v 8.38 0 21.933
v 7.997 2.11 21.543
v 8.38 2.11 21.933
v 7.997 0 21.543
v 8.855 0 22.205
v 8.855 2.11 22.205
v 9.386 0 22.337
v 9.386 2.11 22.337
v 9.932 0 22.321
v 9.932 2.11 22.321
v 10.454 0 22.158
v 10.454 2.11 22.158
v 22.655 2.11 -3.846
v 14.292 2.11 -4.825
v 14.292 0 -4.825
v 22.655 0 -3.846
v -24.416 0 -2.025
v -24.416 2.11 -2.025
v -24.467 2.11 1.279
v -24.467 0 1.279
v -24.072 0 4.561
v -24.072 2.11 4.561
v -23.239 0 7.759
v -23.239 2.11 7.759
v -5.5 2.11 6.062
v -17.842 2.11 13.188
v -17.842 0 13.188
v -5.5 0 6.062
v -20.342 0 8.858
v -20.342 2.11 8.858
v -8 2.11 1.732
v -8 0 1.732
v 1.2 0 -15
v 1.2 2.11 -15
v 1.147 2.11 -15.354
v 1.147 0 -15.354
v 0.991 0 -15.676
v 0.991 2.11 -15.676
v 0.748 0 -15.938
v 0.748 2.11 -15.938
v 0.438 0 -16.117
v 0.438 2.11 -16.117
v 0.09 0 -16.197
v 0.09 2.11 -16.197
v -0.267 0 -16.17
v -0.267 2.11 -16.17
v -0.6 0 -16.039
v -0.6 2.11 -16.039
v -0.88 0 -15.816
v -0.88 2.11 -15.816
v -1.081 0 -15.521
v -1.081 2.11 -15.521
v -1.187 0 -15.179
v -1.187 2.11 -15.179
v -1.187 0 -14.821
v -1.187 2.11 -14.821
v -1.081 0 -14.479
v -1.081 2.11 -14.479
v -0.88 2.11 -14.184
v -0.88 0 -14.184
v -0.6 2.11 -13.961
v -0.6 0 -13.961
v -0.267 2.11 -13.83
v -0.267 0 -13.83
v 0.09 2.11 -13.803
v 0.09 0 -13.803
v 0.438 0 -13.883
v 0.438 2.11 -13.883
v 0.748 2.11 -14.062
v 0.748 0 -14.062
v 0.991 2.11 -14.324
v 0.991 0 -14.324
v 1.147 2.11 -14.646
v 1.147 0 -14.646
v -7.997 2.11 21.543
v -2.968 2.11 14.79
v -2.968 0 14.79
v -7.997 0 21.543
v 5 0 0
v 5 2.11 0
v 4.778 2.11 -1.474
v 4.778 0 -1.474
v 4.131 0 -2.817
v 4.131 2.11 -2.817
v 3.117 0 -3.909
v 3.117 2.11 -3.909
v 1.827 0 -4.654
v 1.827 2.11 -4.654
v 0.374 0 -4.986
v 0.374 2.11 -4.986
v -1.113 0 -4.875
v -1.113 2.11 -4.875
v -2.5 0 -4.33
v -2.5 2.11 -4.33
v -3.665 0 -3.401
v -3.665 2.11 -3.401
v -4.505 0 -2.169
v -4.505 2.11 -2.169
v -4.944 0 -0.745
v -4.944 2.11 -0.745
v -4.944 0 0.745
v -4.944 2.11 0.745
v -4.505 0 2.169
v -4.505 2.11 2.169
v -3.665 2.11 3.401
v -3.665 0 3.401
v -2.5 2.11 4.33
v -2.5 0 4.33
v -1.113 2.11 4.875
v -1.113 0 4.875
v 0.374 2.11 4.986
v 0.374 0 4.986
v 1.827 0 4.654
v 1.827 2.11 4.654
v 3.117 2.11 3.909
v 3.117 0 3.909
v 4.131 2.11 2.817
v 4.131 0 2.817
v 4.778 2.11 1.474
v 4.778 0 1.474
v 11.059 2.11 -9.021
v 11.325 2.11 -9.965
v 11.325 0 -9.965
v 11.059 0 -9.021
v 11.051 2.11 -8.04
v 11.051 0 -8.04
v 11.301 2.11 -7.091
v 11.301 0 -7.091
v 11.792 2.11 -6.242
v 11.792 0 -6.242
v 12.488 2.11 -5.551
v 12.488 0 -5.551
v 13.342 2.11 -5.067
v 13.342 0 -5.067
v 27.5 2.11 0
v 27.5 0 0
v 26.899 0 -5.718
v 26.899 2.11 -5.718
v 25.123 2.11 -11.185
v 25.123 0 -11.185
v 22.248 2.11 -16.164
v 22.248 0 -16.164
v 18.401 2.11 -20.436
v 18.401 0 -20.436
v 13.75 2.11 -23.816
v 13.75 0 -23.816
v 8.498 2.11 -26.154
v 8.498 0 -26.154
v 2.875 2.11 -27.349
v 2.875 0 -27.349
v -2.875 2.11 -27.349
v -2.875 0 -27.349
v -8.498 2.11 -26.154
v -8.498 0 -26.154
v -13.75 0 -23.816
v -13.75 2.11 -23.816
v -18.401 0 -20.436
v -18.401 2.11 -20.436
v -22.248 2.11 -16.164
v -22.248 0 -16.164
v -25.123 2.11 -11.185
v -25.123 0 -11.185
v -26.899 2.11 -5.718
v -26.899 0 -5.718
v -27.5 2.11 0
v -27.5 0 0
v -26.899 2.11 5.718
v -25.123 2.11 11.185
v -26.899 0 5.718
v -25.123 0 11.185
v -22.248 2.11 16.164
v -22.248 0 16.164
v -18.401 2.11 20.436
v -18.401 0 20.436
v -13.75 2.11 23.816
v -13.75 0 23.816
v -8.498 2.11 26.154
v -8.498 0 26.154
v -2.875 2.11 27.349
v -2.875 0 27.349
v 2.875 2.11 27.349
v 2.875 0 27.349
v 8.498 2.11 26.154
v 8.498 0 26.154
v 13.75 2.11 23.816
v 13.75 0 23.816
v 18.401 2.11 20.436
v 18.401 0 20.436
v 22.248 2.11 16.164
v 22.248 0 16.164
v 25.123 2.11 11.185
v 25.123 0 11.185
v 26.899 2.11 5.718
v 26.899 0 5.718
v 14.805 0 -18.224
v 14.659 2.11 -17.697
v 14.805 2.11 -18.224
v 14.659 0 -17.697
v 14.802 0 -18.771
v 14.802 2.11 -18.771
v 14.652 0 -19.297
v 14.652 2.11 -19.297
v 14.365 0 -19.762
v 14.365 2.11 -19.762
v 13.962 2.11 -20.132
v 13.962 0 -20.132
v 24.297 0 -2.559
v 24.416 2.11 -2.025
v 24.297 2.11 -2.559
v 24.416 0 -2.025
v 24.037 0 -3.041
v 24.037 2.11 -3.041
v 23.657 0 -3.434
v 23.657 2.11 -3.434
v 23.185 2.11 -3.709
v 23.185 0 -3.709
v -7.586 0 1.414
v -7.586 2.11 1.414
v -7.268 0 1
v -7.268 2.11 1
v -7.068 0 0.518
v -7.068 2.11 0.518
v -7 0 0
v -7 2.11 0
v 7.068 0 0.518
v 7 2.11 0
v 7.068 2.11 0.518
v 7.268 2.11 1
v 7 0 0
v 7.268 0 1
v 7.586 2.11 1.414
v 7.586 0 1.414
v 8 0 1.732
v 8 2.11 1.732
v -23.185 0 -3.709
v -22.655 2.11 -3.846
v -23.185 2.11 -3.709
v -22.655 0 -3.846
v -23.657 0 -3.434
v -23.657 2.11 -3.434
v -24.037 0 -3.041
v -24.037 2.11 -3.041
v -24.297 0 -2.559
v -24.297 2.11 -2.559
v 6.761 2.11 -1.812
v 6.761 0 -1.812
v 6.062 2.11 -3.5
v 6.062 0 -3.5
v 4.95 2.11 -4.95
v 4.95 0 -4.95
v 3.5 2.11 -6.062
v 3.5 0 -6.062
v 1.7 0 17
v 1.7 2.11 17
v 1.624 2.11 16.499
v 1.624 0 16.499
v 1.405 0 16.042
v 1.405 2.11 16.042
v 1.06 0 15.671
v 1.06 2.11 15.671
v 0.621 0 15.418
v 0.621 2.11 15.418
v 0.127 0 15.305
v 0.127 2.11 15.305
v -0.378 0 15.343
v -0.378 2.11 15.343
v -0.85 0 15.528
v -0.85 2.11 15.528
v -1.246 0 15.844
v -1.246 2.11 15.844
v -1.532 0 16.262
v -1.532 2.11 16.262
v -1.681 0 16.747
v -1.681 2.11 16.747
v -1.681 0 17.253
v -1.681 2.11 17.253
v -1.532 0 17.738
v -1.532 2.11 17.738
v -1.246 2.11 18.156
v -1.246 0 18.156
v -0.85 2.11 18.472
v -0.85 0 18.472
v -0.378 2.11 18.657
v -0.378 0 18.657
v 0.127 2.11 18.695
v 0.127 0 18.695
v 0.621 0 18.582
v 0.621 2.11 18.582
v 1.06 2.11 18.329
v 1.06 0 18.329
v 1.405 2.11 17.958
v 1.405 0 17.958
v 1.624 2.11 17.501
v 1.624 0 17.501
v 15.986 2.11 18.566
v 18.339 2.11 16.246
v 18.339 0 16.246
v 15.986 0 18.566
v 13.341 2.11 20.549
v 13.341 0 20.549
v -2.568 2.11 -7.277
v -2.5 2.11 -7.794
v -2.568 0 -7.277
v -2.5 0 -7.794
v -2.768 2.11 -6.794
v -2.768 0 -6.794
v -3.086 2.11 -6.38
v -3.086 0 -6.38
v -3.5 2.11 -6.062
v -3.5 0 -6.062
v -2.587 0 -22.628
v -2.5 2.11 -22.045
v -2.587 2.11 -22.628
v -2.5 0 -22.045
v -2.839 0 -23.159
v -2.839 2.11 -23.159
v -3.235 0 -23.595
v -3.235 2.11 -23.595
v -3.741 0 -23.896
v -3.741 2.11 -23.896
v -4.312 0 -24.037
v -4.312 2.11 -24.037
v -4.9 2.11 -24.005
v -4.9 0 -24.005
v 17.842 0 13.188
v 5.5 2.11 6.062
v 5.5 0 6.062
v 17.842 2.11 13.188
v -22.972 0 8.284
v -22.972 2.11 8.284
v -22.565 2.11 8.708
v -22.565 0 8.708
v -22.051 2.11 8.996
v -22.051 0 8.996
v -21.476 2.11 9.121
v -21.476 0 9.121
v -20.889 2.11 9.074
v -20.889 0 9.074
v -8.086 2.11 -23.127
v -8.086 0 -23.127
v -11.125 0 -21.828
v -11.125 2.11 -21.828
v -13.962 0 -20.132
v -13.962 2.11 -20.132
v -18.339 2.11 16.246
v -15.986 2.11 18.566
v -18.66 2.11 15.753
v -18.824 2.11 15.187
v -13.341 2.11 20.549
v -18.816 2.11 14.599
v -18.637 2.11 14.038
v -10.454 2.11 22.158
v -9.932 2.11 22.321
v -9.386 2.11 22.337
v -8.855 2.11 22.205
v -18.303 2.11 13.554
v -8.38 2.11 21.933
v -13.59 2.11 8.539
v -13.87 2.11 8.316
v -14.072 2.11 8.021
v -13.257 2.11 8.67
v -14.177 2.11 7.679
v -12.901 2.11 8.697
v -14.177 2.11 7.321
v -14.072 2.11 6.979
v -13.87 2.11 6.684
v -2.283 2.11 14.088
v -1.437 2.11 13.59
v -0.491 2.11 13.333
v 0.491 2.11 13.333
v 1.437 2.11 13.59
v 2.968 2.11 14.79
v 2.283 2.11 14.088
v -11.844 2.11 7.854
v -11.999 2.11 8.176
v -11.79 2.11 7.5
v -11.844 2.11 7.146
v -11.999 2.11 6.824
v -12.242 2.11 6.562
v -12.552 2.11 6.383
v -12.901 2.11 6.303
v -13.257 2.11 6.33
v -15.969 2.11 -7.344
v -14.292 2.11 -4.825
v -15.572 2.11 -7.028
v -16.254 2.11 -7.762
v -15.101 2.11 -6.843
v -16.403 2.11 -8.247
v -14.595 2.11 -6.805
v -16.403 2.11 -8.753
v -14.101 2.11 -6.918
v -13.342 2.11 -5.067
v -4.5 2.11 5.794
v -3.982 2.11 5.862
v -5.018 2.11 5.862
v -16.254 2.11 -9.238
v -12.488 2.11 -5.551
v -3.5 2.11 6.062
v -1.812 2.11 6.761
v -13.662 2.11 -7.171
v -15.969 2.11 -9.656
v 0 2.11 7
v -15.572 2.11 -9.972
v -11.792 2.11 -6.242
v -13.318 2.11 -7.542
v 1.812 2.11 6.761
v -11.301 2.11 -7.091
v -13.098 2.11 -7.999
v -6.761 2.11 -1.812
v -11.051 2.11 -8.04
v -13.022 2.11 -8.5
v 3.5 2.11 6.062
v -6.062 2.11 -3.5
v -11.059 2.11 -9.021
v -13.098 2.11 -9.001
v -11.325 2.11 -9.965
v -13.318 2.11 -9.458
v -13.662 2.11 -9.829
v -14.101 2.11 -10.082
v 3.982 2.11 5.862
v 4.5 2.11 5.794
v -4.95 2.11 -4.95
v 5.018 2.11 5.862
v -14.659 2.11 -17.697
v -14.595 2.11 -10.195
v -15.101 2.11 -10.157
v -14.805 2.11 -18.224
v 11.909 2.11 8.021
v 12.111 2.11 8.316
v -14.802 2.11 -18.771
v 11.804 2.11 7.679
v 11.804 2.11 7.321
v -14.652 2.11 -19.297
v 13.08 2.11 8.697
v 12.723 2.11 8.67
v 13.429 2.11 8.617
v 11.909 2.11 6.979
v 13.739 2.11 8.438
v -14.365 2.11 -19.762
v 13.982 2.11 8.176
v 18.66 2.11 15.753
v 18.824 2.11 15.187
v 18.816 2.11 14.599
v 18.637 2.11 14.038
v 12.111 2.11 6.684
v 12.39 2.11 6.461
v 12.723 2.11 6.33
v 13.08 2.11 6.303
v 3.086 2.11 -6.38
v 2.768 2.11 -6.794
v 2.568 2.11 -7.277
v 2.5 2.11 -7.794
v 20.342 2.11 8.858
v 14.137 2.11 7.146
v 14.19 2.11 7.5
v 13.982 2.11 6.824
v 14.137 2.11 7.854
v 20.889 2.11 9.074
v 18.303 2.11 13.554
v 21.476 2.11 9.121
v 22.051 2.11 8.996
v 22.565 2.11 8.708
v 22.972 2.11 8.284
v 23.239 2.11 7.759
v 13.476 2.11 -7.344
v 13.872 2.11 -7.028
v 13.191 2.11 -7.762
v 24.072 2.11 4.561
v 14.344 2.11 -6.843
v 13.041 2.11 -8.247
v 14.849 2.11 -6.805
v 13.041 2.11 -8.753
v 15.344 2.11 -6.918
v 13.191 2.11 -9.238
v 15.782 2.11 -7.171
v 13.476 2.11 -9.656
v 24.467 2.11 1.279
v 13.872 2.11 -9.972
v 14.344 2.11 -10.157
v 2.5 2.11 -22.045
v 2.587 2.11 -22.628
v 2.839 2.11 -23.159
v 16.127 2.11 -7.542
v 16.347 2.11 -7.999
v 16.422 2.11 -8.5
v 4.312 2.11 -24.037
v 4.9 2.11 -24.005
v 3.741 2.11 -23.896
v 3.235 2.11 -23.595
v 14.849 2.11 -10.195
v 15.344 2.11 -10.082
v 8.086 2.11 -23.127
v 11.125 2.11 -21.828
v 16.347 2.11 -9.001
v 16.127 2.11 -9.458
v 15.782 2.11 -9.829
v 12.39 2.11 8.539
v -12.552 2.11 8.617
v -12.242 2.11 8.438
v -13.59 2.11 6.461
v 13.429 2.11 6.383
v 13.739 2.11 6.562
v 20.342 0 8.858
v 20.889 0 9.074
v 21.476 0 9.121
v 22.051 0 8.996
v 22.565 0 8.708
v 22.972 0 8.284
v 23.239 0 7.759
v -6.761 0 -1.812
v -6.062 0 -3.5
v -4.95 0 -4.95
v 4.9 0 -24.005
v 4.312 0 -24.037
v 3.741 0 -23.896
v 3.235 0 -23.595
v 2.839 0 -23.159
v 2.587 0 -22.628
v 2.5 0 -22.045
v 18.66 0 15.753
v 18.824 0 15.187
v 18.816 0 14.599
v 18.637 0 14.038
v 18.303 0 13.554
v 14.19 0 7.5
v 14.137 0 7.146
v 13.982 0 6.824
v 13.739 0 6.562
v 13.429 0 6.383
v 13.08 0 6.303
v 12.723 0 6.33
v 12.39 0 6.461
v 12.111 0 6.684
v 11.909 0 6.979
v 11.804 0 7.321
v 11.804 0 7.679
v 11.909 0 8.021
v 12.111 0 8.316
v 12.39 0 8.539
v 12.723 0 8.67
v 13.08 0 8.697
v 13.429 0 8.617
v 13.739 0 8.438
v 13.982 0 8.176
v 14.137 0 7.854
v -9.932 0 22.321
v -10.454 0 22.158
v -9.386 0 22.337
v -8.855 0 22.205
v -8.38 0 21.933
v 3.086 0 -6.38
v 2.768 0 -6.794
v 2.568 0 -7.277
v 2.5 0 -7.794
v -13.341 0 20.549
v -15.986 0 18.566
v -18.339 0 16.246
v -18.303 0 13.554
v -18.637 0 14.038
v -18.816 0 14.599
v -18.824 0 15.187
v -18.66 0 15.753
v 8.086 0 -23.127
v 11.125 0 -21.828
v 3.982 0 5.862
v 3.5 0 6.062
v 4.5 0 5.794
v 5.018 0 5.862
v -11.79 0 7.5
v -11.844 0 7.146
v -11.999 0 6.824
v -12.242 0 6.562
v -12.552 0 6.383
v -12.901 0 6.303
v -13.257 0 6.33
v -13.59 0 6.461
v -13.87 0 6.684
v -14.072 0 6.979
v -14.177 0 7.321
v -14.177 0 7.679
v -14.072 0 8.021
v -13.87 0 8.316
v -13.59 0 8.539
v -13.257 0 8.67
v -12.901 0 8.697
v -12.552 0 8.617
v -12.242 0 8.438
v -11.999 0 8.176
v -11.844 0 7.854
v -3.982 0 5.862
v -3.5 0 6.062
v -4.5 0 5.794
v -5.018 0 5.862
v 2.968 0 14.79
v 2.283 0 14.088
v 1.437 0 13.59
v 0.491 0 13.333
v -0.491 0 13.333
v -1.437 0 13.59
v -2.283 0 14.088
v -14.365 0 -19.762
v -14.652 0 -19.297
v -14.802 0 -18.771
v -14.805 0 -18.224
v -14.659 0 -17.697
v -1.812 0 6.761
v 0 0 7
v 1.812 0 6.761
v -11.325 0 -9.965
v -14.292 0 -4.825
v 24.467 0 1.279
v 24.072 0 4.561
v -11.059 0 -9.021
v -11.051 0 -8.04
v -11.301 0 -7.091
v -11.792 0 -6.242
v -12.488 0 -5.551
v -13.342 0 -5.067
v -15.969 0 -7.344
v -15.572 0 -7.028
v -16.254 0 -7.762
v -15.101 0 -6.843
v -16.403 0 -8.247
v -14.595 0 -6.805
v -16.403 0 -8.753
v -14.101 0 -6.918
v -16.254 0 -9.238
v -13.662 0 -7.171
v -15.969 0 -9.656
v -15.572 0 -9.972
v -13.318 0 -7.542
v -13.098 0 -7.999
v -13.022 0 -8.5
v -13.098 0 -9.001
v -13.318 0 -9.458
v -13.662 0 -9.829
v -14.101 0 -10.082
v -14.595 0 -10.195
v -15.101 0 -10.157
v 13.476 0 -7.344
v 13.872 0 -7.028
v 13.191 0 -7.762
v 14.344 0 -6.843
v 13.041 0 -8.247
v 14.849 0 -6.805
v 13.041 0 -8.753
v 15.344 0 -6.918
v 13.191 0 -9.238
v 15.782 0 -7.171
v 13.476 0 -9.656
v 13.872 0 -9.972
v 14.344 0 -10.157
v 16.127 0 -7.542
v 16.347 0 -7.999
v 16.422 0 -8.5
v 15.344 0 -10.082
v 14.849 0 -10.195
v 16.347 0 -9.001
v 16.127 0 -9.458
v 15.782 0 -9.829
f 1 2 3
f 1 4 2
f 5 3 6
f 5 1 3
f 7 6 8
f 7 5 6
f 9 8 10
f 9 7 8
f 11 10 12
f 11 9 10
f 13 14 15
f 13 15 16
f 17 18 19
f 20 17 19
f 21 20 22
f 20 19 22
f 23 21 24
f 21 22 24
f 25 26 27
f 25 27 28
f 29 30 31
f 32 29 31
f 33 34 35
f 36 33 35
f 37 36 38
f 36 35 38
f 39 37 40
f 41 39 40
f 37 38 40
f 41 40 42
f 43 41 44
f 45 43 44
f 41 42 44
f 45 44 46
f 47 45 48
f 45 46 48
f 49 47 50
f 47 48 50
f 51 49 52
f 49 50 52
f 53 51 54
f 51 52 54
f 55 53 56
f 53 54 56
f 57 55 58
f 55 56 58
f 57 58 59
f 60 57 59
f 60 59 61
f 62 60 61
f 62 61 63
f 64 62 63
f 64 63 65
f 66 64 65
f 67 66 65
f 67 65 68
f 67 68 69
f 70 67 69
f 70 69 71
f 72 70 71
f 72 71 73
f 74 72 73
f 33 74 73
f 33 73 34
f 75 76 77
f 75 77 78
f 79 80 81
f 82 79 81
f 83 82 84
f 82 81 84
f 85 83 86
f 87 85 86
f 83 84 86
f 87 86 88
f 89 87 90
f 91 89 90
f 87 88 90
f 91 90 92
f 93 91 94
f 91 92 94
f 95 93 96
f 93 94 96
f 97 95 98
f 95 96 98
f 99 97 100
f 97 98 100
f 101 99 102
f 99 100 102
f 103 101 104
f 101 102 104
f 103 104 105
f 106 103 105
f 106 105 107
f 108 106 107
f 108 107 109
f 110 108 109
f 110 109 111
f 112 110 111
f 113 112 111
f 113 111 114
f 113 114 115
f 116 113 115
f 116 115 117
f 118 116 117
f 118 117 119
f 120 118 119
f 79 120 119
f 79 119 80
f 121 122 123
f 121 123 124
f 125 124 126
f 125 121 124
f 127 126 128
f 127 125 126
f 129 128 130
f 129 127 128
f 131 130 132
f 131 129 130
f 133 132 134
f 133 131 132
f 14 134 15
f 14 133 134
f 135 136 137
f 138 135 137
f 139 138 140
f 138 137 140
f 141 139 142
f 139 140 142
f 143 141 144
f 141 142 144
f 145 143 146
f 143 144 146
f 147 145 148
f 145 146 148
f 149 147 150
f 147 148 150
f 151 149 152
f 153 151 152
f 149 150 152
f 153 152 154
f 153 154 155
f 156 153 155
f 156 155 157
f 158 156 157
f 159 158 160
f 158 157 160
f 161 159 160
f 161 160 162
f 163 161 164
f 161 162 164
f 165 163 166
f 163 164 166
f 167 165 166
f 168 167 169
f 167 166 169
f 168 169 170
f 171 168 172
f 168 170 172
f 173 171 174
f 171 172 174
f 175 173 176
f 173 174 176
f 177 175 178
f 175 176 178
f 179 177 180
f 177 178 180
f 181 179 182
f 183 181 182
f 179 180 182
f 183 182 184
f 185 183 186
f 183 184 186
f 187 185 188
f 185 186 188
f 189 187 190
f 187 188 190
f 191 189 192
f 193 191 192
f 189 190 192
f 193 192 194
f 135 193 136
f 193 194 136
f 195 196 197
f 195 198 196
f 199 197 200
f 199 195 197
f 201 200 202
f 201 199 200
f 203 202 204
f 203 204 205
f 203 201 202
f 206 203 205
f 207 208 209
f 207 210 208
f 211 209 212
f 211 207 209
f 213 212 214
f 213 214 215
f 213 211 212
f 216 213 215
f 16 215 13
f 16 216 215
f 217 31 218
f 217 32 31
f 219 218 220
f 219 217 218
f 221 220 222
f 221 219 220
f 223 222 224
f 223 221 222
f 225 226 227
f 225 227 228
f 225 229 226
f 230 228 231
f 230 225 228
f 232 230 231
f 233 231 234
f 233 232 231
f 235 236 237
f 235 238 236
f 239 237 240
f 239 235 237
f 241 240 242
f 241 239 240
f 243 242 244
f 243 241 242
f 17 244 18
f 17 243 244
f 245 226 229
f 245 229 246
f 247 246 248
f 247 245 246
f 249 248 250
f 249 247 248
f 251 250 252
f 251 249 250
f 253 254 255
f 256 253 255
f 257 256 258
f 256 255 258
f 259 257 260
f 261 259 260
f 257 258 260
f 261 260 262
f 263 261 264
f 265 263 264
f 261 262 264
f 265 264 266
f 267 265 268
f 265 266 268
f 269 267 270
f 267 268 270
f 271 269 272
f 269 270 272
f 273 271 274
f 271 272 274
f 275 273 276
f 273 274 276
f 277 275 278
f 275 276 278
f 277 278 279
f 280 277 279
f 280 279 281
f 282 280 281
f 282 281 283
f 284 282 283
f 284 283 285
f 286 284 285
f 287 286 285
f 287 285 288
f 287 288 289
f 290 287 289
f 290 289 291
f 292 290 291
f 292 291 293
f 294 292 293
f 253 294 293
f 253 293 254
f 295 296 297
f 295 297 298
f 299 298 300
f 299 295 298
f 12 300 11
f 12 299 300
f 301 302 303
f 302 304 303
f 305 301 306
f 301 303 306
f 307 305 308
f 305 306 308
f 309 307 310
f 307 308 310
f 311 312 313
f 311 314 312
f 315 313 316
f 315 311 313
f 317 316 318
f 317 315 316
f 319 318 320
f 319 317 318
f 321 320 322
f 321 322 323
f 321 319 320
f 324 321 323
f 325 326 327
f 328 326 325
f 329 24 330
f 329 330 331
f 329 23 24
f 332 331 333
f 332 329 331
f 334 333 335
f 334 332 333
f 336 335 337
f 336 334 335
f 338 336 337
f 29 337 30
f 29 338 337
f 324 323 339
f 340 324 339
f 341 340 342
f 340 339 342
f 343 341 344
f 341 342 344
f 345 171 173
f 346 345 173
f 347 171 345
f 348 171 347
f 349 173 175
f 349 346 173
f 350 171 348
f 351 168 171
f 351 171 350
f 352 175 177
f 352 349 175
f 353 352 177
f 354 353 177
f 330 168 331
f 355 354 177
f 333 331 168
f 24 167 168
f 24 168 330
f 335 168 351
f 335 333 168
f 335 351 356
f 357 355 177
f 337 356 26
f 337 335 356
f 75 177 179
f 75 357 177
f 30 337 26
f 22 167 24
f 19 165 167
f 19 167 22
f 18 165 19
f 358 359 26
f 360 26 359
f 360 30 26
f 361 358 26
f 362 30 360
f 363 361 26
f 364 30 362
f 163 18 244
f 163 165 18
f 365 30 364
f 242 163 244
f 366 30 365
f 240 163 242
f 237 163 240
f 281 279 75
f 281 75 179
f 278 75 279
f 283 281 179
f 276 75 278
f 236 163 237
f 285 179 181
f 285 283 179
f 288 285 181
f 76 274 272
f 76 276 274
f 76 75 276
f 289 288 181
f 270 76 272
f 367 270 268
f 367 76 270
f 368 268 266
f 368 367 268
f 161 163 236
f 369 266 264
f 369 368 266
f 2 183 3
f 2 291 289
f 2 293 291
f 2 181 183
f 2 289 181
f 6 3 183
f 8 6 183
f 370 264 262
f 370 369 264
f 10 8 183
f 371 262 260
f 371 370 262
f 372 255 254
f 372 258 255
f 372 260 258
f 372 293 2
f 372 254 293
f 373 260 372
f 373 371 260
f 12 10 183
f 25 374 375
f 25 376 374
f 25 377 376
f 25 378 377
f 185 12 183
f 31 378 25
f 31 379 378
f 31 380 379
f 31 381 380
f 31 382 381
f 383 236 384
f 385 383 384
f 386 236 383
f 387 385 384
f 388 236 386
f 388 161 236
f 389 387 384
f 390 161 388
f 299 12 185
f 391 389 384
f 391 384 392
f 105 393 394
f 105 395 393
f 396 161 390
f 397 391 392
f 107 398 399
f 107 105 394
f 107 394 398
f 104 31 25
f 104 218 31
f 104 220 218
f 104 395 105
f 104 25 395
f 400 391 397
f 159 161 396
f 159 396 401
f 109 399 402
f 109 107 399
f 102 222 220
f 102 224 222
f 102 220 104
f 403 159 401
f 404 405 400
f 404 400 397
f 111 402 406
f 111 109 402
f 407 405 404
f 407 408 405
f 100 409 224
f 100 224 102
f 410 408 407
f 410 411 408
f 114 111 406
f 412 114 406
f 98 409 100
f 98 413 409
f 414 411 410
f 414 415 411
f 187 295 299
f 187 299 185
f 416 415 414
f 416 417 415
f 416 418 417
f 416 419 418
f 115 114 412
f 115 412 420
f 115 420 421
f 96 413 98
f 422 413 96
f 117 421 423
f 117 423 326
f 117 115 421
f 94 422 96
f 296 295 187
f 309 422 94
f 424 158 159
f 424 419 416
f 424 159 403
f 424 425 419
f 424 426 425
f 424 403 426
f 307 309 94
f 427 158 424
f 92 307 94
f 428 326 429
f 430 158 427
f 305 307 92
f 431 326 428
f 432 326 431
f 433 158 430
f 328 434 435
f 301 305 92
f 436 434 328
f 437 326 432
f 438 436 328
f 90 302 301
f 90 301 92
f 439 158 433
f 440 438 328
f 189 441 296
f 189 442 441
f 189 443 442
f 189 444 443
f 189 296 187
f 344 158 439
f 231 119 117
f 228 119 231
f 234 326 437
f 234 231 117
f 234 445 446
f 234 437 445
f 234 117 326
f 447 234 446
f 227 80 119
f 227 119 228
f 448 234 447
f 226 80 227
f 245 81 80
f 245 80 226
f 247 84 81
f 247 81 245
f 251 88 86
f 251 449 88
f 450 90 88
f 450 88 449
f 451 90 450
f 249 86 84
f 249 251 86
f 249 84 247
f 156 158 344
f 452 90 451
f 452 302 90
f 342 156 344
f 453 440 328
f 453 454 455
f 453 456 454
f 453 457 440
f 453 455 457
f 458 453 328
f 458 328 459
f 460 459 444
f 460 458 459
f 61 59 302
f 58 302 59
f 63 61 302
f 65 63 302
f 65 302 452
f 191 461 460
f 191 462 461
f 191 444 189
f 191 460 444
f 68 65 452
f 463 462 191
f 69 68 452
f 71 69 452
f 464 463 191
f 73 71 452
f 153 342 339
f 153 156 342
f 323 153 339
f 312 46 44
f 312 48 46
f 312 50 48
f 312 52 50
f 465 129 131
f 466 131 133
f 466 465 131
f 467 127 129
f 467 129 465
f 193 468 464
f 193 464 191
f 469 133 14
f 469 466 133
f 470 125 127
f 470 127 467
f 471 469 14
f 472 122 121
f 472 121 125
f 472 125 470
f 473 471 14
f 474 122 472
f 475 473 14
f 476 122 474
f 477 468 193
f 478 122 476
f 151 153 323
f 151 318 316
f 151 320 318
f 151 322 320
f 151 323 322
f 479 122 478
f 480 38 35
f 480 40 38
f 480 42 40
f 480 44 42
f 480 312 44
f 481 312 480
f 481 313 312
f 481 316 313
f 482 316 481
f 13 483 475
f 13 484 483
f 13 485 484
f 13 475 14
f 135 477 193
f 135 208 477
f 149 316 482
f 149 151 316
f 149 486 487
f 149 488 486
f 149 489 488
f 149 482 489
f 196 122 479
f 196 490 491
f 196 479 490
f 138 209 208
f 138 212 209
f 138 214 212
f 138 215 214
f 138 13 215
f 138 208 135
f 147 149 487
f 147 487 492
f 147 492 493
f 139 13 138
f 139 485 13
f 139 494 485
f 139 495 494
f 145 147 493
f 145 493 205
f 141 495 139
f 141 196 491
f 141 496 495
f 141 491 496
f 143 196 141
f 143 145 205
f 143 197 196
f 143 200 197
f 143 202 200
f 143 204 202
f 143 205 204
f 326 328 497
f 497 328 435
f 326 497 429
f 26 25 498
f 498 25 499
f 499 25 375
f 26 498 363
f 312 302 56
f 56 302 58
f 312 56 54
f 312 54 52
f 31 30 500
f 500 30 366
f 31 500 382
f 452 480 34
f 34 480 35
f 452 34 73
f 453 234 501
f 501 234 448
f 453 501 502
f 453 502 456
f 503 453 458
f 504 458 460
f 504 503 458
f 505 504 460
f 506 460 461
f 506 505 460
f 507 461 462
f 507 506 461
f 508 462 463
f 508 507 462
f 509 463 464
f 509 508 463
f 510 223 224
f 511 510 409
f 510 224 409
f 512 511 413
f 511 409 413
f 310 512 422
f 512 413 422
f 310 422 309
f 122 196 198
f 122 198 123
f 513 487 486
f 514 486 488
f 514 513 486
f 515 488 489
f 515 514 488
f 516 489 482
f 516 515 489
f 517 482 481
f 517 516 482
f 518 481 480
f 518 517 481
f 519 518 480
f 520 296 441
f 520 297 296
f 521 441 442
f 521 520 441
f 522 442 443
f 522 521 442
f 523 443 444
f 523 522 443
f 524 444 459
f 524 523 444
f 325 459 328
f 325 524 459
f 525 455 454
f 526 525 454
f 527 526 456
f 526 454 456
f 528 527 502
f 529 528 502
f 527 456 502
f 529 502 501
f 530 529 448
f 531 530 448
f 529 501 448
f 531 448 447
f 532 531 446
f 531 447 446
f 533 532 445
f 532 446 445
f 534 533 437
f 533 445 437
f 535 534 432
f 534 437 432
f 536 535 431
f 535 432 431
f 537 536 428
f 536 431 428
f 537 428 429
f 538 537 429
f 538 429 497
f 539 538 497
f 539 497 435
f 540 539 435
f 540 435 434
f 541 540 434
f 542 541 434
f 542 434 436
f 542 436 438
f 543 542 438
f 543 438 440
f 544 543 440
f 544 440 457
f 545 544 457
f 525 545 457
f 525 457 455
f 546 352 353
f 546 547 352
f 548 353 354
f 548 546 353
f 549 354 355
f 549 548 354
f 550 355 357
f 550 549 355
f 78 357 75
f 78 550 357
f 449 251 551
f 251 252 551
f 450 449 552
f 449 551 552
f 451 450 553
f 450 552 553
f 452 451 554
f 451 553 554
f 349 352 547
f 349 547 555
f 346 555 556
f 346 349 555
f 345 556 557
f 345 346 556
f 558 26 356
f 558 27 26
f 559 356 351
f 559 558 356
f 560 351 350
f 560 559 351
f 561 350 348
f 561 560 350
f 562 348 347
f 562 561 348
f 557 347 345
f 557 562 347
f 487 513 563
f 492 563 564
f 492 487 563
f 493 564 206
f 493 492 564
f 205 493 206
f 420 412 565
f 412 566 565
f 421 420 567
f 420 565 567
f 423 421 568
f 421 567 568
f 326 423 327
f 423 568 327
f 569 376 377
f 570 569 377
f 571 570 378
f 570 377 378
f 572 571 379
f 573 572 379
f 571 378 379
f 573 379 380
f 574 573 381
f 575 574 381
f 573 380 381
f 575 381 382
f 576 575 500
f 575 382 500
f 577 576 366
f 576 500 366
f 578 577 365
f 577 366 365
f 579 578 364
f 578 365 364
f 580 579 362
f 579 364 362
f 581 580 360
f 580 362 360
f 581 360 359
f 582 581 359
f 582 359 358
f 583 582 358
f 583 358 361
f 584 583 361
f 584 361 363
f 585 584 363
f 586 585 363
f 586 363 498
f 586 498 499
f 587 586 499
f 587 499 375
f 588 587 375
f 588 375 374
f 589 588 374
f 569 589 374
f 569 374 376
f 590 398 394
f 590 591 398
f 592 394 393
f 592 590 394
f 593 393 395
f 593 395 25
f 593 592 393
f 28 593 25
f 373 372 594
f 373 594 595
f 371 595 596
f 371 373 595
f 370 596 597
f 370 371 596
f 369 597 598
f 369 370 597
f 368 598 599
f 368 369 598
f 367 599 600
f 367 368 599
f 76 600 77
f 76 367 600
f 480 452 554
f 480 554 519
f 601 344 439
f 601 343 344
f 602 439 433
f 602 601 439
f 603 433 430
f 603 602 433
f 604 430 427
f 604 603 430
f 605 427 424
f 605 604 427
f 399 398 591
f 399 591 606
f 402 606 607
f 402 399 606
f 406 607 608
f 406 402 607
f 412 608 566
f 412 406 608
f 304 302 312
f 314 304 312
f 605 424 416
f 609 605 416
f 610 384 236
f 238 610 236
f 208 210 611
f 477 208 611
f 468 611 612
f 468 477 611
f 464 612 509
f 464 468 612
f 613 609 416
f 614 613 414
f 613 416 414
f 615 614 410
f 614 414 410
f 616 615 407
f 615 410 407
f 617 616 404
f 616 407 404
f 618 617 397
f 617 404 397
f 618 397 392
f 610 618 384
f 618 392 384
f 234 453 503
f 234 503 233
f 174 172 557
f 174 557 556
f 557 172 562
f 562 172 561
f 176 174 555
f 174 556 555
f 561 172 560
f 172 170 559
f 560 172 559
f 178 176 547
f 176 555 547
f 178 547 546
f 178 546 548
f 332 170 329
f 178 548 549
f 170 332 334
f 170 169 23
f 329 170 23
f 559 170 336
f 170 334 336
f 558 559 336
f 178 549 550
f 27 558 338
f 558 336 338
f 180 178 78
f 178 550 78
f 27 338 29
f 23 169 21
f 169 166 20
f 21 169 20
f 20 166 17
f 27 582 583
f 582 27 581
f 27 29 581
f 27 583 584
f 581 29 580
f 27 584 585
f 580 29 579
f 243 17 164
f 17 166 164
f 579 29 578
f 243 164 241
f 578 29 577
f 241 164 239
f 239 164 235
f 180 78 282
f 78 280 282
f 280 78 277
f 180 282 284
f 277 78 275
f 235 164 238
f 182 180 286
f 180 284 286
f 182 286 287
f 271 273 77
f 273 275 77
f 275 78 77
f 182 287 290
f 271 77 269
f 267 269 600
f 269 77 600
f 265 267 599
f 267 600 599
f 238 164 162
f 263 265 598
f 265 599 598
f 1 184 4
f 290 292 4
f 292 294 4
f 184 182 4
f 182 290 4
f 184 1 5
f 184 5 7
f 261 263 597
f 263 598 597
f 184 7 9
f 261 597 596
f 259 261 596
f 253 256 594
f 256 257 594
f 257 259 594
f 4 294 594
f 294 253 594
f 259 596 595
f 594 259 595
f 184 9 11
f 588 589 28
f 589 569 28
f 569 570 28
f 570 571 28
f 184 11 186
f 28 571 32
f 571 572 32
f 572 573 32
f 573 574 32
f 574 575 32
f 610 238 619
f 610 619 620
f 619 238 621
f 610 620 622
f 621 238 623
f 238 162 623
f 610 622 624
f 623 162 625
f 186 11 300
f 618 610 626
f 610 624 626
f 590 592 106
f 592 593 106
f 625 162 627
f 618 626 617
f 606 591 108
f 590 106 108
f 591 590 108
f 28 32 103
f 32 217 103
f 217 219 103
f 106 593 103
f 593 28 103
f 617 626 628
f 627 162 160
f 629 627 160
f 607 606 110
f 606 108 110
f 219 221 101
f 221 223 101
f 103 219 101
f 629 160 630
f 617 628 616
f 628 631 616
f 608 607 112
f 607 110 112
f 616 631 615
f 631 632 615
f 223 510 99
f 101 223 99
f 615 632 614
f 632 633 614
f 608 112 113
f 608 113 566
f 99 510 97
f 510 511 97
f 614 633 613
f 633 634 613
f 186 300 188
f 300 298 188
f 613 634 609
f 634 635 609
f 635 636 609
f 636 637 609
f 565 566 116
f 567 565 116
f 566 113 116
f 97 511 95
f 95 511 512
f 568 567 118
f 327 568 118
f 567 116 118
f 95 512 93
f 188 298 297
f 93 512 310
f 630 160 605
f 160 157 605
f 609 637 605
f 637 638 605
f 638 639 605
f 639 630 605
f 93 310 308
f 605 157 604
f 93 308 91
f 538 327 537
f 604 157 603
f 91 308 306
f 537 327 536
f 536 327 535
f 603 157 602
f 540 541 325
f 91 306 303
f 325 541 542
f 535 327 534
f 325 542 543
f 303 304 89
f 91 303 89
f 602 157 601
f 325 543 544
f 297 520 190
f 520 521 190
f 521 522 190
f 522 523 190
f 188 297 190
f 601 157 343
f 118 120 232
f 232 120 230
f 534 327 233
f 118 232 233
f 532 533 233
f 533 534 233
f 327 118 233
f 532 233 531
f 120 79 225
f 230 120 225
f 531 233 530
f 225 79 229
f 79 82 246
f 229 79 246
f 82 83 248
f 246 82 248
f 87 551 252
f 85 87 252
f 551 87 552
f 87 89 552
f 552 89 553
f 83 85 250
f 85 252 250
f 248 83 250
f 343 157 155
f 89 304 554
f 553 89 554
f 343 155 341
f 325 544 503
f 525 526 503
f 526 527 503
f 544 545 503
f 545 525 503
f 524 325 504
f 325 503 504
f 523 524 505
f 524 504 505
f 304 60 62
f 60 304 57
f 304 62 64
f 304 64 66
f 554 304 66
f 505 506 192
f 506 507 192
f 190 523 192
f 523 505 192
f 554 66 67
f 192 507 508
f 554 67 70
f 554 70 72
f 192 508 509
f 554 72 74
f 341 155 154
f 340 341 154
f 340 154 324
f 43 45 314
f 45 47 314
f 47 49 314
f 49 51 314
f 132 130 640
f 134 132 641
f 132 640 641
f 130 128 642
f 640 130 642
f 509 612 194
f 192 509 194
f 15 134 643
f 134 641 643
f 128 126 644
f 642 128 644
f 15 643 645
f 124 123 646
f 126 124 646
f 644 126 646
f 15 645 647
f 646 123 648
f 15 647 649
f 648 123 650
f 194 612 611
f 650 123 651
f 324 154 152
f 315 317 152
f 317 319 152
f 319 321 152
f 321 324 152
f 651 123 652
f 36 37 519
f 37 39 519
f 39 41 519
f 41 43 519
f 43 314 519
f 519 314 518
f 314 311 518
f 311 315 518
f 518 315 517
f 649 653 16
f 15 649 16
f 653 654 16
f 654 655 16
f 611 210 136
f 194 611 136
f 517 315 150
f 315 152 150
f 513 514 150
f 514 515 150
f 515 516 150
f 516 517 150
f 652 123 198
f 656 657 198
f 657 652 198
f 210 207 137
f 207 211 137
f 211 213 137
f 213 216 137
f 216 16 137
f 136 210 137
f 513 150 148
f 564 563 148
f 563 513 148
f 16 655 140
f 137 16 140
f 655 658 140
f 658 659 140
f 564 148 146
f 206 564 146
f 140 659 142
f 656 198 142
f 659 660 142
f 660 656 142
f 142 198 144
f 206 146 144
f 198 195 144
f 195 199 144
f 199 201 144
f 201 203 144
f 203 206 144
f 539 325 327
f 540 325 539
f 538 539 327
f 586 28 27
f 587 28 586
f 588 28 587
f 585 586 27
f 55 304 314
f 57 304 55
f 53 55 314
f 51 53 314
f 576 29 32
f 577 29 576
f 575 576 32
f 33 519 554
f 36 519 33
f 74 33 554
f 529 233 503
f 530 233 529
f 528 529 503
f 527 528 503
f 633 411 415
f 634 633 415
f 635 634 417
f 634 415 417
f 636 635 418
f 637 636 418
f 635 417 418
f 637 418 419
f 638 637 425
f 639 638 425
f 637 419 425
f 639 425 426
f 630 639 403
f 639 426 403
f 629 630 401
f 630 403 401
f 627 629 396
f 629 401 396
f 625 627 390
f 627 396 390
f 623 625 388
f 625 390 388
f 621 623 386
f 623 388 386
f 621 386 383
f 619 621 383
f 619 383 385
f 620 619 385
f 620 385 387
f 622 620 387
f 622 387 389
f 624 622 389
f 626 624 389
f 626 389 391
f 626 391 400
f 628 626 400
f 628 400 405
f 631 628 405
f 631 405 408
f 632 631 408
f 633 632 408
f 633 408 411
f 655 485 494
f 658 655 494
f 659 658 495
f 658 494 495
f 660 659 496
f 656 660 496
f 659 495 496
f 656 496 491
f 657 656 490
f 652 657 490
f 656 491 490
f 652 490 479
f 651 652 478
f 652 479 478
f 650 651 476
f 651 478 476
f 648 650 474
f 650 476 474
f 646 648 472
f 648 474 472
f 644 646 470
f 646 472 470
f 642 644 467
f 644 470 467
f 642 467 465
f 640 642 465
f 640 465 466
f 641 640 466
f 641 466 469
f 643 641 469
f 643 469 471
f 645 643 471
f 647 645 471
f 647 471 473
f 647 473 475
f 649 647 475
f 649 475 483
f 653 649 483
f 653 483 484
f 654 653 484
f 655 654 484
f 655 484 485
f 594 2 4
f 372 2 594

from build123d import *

# Parameters (mm, degrees)
CROQUIS1_R              = 27.5
SALIENTE_EXTRUIR1_DEPTH = 2.11
CROQUIS2_R              = 1.2
CROQUIS2_R_2            = 5
CROQUIS2_R_3            = 1.7
CORTAR_EXTRUIR1_DEPTH   = 3.11
REDONDEO1_R             = 2


with BuildPart() as part:
    # Croquis1 → Saliente-Extruir1 (new body)
    with BuildSketch(Plane(origin=(0, 0, 0), x_dir=(1, 0, 0), z_dir=(0, 1, 0))):
        Circle(CROQUIS1_R)
    extrude(amount=SALIENTE_EXTRUIR1_DEPTH)

    # Croquis2 → Cortar-Extruir1 (cut, through all)
    with BuildSketch(Plane(origin=(0, 2.11, 0), x_dir=(1, 0, 0), z_dir=(0, 1, 0))):
        with Locations((0, 15)):
            Circle(CROQUIS2_R)
        with Locations((12.990381057, -7.5)):
            Circle(CROQUIS2_R)
        with Locations((-12.990381057, -7.5)):
            Circle(CROQUIS2_R)
        Circle(CROQUIS2_R_2)
        with Locations((-14.722431864, 8.5)):
            Circle(CROQUIS2_R_3)
        with Locations((14.722431864, 8.5)):
            Circle(CROQUIS2_R_3)
        with Locations((0, -17)):
            Circle(CROQUIS2_R_3)
        with BuildLine():
            Line((-2.5, 6.538348415), (-2.5, 24.372115214))
            ThreePointArc((-2.5, 24.372115214), (-9.267968283, 22.679390731), (-15.28445201, 19.147729023))
            Line((-15.28445201, 19.147729023), (-11.324842647, 9.965055464))
            ThreePointArc((-11.324842647, 9.965055464), (-11.51813787, 6.65), (-14.292412506, 4.825073694))
            Line((-14.292412506, 4.825073694), (-24.224645764, 3.662859212))
            ThreePointArc((-24.224645764, 3.662859212), (-24.274912656, -3.313399391), (-22.356870919, -10.020994097))
            Line((-22.356870919, -10.020994097), (-6.912375826, -1.104110698))
            ThreePointArc((-6.912375826, -1.104110698), (-6.062177826, 3.5), (-2.5, 6.538348415))
        make_face()
        with BuildLine():
            Line((2.5, 6.538348415), (2.5, 24.372115214))
            ThreePointArc((2.5, 24.372115214), (9.267968283, 22.679390731), (15.28445201, 19.147729023))
            Line((15.28445201, 19.147729023), (11.324842647, 9.965055464))
            ThreePointArc((11.324842647, 9.965055464), (11.51813787, 6.65), (14.292412506, 4.825073694))
            Line((14.292412506, 4.825073694), (24.224645764, 3.662859212))
            ThreePointArc((24.224645764, 3.662859212), (24.274912656, -3.313399391), (22.356870919, -10.020994097))
            Line((22.356870919, -10.020994097), (6.912375826, -1.104110698))
            ThreePointArc((6.912375826, -1.104110698), (6.062177826, 3.5), (2.5, 6.538348415))
        make_face()
        with BuildLine():
            Line((4.412375826, -5.434237717), (19.856870919, -14.351121116))
            ThreePointArc((19.856870919, -14.351121116), (15.006944374, -19.36599134), (8.940193754, -22.810588235))
            Line((8.940193754, -22.810588235), (2.967569858, -14.790129159))
            ThreePointArc((2.967569858, -14.790129159), (0, -13.3), (-2.967569858, -14.790129159))
            Line((-2.967569858, -14.790129159), (-8.940193754, -22.810588235))
            ThreePointArc((-8.940193754, -22.810588235), (-15.006944374, -19.36599134), (-19.856870919, -14.351121116))
            Line((-19.856870919, -14.351121116), (-4.412375826, -5.434237717))
            ThreePointArc((-4.412375826, -5.434237717), (0, -7), (4.412375826, -5.434237717))
        make_face()
    extrude(amount=-CORTAR_EXTRUIR1_DEPTH, mode=Mode.SUBTRACT)

    # Redondeo1
    redondeo1_edges = [part.edges().sort_by_distance(p)[0] for p in [
        (6.912375826, 1.055, 1.104110698),
        (2.5, 1.055, -6.538348415),
        (2.5, 1.055, -24.372115214),
        (15.28445201, 1.055, -19.147729023),
        (24.224645764, 1.055, -3.662859212),
        (22.356870919, 1.055, 10.020994097),
        (-4.412375826, 1.055, 5.434237717),
        (4.412375826, 1.055, 5.434237717),
        (19.856870919, 1.055, 14.351121116),
        (8.940193754, 1.055, 22.810588235),
        (-8.940193754, 1.055, 22.810588235),
        (-19.856870919, 1.055, 14.351121116),
        (-2.5, 1.055, -6.538348415),
        (-6.912375826, 1.055, 1.104110698),
        (-22.356870919, 1.055, 10.020994097),
        (-24.224645764, 1.055, -3.662859212),
        (-15.28445201, 1.055, -19.147729023),
        (-2.5, 1.055, -24.372115214),
    ]]
    fillet(redondeo1_edges, radius=REDONDEO1_R)


solid = part.part
